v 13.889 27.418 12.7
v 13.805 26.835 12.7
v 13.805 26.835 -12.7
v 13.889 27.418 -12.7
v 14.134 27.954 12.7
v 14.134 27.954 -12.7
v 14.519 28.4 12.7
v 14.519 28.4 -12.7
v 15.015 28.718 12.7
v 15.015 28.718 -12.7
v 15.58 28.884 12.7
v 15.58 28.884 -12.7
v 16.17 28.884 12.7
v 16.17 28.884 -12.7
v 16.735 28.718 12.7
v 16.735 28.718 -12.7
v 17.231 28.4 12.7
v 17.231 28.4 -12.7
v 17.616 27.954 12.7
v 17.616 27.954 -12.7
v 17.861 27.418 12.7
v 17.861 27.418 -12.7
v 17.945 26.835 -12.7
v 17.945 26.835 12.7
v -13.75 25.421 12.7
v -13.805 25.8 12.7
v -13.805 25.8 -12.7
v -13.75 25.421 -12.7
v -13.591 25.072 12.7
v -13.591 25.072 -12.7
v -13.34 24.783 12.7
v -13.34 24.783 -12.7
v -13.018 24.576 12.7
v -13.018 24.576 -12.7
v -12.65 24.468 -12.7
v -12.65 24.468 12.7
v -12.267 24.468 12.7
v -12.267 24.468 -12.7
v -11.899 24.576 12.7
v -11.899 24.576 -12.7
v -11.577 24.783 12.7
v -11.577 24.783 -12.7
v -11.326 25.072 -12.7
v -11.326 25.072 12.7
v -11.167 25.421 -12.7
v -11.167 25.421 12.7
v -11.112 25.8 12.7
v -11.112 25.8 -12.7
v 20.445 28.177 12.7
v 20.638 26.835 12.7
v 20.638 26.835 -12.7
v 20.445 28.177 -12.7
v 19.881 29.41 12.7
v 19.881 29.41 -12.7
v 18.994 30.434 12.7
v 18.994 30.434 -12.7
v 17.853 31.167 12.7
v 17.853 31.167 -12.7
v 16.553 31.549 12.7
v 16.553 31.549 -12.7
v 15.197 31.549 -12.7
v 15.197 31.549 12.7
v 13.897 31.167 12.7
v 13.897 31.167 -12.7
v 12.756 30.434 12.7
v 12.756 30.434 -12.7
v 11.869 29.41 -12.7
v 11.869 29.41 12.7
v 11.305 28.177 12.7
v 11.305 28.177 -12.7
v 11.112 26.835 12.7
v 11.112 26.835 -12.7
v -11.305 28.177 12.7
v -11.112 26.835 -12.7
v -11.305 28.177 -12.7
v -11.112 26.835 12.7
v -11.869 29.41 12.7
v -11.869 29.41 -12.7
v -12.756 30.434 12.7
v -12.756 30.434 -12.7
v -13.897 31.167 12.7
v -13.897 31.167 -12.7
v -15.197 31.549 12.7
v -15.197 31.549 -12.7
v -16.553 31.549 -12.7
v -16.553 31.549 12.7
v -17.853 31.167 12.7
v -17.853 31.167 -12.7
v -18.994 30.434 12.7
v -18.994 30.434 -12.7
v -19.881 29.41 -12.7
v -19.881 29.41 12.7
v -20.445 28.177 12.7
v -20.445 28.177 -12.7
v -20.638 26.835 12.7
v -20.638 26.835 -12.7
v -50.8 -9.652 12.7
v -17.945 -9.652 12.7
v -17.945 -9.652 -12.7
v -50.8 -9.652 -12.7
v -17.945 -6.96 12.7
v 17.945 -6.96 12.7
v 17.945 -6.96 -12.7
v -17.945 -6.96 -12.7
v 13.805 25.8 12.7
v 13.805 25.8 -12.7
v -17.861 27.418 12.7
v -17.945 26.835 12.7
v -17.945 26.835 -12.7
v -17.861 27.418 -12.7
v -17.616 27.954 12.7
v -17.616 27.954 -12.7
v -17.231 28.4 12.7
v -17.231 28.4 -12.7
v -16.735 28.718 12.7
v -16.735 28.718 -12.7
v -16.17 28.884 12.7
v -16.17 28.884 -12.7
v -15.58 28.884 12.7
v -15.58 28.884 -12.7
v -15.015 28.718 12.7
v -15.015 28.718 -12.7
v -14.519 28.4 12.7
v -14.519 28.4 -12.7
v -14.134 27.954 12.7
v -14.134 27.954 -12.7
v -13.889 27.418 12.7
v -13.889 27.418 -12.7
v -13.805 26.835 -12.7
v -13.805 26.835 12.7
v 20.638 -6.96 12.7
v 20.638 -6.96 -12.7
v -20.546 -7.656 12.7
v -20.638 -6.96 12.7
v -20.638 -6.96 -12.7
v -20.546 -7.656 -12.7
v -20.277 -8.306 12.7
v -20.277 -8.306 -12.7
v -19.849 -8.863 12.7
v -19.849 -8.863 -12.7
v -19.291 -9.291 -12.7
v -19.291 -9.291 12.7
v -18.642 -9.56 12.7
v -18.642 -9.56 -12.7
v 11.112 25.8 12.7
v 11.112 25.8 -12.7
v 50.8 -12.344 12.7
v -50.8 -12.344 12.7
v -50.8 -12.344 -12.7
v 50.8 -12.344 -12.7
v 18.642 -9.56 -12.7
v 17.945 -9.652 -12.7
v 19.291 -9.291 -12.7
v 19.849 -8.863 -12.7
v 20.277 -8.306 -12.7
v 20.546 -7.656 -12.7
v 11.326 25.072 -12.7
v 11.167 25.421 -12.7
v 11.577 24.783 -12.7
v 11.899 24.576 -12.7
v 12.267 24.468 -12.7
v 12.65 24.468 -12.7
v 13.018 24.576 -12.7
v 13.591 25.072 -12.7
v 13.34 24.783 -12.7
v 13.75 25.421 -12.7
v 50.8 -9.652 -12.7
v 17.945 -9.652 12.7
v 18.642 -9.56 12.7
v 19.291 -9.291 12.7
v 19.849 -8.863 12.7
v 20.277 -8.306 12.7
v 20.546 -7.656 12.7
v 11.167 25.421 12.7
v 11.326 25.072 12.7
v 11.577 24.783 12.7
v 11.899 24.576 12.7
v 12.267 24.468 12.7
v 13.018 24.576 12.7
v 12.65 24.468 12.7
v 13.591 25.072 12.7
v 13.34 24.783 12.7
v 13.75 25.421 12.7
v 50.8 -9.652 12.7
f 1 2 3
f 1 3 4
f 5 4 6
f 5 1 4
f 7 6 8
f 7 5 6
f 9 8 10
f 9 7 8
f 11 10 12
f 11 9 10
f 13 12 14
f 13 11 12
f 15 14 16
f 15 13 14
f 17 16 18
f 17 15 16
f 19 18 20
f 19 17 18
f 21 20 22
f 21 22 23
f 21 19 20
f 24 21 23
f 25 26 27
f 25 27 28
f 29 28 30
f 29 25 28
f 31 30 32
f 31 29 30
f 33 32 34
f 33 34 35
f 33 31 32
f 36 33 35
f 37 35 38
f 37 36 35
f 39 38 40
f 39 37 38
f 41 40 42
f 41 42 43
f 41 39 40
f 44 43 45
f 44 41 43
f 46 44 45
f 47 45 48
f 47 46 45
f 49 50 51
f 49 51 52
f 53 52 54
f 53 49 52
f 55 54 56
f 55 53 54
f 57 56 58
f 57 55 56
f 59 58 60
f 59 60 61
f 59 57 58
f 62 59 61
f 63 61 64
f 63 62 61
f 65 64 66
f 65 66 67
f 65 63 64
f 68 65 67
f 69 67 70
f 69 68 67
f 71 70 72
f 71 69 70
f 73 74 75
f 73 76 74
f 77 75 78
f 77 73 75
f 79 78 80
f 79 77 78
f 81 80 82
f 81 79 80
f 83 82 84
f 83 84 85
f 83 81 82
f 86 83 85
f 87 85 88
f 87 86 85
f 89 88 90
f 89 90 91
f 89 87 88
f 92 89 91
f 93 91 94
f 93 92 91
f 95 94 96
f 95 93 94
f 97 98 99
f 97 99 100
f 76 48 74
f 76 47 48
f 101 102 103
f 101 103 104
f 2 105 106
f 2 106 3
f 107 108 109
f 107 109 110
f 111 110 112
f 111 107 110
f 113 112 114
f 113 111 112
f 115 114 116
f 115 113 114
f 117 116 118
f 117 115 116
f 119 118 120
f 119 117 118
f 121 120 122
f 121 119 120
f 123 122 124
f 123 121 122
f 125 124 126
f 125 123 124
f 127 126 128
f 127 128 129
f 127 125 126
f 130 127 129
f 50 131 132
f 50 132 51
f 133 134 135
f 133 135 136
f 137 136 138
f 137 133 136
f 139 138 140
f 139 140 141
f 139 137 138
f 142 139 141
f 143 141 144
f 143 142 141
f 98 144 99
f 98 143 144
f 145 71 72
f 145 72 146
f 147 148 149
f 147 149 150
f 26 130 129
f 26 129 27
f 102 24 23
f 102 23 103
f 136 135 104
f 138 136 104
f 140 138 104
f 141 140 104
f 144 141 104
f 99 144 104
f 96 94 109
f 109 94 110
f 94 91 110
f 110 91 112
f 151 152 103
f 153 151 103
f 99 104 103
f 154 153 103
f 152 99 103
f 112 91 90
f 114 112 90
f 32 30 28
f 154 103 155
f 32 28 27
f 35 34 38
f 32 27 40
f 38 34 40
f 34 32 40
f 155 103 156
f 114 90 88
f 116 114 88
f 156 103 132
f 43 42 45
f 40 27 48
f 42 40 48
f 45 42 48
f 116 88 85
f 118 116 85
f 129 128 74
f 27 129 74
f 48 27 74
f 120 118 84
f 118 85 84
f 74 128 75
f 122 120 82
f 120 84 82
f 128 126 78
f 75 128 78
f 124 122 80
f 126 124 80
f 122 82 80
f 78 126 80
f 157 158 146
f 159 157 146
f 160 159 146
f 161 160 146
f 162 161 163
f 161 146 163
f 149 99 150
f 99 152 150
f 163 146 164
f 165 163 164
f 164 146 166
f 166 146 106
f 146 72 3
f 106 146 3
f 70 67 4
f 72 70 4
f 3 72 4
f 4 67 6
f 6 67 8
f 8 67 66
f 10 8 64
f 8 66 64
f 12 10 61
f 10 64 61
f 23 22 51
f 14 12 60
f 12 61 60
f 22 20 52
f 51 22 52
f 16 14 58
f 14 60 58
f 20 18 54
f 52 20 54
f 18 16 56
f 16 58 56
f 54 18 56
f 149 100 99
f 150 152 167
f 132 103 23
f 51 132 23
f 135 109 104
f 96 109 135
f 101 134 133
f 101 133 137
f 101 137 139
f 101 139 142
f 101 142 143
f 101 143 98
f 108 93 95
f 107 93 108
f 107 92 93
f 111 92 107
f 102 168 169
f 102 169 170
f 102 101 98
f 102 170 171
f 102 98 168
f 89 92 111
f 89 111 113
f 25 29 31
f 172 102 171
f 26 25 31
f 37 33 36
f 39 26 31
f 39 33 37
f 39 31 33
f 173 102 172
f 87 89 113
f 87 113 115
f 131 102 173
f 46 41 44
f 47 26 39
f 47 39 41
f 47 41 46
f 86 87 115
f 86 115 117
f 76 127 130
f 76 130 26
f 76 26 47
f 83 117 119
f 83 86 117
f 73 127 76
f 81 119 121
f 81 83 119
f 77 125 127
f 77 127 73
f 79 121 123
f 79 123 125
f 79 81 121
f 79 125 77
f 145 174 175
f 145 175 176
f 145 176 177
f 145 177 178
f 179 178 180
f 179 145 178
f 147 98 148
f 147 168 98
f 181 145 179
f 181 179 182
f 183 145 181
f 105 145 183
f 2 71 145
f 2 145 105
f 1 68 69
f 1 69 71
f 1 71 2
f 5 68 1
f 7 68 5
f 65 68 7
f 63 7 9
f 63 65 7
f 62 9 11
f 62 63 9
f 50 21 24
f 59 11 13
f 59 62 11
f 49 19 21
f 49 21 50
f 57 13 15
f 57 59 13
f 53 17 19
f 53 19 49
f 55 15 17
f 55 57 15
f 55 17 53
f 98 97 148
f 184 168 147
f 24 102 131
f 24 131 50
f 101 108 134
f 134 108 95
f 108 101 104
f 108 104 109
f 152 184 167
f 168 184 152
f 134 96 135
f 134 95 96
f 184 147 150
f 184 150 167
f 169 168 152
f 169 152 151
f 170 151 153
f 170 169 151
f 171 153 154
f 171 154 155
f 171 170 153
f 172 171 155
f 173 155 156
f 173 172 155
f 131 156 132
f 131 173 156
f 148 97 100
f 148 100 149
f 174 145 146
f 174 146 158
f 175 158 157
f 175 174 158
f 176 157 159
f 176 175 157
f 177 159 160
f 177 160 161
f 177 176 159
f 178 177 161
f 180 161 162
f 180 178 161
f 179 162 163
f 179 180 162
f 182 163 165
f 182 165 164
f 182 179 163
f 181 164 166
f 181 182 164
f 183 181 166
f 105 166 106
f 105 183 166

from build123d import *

# Parameters (mm, degrees)
BASE_EXTRUDE_DEPTH = 12.7


with BuildPart() as part:
    # Sketch1 → Base-Extrude (new, symmetric)
    with BuildSketch(Plane.XY):
        with BuildLine():
            Line((-20.6375, 26.8351), (-20.6375, -6.9596))
            ThreePointArc((-20.6375, -6.9596), (-19.848914298, -8.863414298), (-17.9451, -9.652))
            Line((-17.9451, -9.652), (-50.8, -9.652))
            Line((-50.8, -9.652), (-50.8, -12.3444))
            Line((-50.8, -12.3444), (50.8, -12.3444))
            Line((50.8, -12.3444), (50.8, -9.652))
            Line((50.8, -9.652), (17.9451, -9.652))
            ThreePointArc((17.9451, -9.652), (19.848914298, -8.863414298), (20.6375, -6.9596))
            Line((20.6375, -6.9596), (20.6375, 26.8351))
            ThreePointArc((20.6375, 26.8351), (15.875, 31.5976), (11.1125, 26.8351))
            Line((11.1125, 26.8351), (11.1125, 25.80005))
            ThreePointArc((11.1125, 25.80005), (12.4587, 24.45385), (13.8049, 25.80005))
            Line((13.8049, 25.80005), (13.8049, 26.8351))
            ThreePointArc((13.8049, 26.8351), (15.875, 28.9052), (17.9451, 26.8351))
            Line((17.9451, 26.8351), (17.9451, -6.9596))
            Line((17.9451, -6.9596), (-17.9451, -6.9596))
            Line((-17.9451, -6.9596), (-17.9451, 26.8351))
            ThreePointArc((-17.9451, 26.8351), (-15.875, 28.9052), (-13.8049, 26.8351))
            Line((-13.8049, 26.8351), (-13.8049, 25.80005))
            ThreePointArc((-13.8049, 25.80005), (-12.4587, 24.45385), (-11.1125, 25.80005))
            Line((-11.1125, 25.80005), (-11.1125, 26.8351))
            ThreePointArc((-11.1125, 26.8351), (-15.875, 31.5976), (-20.6375, 26.8351))
        make_face()
    extrude(amount=BASE_EXTRUDE_DEPTH, both=True)


solid = part.part
